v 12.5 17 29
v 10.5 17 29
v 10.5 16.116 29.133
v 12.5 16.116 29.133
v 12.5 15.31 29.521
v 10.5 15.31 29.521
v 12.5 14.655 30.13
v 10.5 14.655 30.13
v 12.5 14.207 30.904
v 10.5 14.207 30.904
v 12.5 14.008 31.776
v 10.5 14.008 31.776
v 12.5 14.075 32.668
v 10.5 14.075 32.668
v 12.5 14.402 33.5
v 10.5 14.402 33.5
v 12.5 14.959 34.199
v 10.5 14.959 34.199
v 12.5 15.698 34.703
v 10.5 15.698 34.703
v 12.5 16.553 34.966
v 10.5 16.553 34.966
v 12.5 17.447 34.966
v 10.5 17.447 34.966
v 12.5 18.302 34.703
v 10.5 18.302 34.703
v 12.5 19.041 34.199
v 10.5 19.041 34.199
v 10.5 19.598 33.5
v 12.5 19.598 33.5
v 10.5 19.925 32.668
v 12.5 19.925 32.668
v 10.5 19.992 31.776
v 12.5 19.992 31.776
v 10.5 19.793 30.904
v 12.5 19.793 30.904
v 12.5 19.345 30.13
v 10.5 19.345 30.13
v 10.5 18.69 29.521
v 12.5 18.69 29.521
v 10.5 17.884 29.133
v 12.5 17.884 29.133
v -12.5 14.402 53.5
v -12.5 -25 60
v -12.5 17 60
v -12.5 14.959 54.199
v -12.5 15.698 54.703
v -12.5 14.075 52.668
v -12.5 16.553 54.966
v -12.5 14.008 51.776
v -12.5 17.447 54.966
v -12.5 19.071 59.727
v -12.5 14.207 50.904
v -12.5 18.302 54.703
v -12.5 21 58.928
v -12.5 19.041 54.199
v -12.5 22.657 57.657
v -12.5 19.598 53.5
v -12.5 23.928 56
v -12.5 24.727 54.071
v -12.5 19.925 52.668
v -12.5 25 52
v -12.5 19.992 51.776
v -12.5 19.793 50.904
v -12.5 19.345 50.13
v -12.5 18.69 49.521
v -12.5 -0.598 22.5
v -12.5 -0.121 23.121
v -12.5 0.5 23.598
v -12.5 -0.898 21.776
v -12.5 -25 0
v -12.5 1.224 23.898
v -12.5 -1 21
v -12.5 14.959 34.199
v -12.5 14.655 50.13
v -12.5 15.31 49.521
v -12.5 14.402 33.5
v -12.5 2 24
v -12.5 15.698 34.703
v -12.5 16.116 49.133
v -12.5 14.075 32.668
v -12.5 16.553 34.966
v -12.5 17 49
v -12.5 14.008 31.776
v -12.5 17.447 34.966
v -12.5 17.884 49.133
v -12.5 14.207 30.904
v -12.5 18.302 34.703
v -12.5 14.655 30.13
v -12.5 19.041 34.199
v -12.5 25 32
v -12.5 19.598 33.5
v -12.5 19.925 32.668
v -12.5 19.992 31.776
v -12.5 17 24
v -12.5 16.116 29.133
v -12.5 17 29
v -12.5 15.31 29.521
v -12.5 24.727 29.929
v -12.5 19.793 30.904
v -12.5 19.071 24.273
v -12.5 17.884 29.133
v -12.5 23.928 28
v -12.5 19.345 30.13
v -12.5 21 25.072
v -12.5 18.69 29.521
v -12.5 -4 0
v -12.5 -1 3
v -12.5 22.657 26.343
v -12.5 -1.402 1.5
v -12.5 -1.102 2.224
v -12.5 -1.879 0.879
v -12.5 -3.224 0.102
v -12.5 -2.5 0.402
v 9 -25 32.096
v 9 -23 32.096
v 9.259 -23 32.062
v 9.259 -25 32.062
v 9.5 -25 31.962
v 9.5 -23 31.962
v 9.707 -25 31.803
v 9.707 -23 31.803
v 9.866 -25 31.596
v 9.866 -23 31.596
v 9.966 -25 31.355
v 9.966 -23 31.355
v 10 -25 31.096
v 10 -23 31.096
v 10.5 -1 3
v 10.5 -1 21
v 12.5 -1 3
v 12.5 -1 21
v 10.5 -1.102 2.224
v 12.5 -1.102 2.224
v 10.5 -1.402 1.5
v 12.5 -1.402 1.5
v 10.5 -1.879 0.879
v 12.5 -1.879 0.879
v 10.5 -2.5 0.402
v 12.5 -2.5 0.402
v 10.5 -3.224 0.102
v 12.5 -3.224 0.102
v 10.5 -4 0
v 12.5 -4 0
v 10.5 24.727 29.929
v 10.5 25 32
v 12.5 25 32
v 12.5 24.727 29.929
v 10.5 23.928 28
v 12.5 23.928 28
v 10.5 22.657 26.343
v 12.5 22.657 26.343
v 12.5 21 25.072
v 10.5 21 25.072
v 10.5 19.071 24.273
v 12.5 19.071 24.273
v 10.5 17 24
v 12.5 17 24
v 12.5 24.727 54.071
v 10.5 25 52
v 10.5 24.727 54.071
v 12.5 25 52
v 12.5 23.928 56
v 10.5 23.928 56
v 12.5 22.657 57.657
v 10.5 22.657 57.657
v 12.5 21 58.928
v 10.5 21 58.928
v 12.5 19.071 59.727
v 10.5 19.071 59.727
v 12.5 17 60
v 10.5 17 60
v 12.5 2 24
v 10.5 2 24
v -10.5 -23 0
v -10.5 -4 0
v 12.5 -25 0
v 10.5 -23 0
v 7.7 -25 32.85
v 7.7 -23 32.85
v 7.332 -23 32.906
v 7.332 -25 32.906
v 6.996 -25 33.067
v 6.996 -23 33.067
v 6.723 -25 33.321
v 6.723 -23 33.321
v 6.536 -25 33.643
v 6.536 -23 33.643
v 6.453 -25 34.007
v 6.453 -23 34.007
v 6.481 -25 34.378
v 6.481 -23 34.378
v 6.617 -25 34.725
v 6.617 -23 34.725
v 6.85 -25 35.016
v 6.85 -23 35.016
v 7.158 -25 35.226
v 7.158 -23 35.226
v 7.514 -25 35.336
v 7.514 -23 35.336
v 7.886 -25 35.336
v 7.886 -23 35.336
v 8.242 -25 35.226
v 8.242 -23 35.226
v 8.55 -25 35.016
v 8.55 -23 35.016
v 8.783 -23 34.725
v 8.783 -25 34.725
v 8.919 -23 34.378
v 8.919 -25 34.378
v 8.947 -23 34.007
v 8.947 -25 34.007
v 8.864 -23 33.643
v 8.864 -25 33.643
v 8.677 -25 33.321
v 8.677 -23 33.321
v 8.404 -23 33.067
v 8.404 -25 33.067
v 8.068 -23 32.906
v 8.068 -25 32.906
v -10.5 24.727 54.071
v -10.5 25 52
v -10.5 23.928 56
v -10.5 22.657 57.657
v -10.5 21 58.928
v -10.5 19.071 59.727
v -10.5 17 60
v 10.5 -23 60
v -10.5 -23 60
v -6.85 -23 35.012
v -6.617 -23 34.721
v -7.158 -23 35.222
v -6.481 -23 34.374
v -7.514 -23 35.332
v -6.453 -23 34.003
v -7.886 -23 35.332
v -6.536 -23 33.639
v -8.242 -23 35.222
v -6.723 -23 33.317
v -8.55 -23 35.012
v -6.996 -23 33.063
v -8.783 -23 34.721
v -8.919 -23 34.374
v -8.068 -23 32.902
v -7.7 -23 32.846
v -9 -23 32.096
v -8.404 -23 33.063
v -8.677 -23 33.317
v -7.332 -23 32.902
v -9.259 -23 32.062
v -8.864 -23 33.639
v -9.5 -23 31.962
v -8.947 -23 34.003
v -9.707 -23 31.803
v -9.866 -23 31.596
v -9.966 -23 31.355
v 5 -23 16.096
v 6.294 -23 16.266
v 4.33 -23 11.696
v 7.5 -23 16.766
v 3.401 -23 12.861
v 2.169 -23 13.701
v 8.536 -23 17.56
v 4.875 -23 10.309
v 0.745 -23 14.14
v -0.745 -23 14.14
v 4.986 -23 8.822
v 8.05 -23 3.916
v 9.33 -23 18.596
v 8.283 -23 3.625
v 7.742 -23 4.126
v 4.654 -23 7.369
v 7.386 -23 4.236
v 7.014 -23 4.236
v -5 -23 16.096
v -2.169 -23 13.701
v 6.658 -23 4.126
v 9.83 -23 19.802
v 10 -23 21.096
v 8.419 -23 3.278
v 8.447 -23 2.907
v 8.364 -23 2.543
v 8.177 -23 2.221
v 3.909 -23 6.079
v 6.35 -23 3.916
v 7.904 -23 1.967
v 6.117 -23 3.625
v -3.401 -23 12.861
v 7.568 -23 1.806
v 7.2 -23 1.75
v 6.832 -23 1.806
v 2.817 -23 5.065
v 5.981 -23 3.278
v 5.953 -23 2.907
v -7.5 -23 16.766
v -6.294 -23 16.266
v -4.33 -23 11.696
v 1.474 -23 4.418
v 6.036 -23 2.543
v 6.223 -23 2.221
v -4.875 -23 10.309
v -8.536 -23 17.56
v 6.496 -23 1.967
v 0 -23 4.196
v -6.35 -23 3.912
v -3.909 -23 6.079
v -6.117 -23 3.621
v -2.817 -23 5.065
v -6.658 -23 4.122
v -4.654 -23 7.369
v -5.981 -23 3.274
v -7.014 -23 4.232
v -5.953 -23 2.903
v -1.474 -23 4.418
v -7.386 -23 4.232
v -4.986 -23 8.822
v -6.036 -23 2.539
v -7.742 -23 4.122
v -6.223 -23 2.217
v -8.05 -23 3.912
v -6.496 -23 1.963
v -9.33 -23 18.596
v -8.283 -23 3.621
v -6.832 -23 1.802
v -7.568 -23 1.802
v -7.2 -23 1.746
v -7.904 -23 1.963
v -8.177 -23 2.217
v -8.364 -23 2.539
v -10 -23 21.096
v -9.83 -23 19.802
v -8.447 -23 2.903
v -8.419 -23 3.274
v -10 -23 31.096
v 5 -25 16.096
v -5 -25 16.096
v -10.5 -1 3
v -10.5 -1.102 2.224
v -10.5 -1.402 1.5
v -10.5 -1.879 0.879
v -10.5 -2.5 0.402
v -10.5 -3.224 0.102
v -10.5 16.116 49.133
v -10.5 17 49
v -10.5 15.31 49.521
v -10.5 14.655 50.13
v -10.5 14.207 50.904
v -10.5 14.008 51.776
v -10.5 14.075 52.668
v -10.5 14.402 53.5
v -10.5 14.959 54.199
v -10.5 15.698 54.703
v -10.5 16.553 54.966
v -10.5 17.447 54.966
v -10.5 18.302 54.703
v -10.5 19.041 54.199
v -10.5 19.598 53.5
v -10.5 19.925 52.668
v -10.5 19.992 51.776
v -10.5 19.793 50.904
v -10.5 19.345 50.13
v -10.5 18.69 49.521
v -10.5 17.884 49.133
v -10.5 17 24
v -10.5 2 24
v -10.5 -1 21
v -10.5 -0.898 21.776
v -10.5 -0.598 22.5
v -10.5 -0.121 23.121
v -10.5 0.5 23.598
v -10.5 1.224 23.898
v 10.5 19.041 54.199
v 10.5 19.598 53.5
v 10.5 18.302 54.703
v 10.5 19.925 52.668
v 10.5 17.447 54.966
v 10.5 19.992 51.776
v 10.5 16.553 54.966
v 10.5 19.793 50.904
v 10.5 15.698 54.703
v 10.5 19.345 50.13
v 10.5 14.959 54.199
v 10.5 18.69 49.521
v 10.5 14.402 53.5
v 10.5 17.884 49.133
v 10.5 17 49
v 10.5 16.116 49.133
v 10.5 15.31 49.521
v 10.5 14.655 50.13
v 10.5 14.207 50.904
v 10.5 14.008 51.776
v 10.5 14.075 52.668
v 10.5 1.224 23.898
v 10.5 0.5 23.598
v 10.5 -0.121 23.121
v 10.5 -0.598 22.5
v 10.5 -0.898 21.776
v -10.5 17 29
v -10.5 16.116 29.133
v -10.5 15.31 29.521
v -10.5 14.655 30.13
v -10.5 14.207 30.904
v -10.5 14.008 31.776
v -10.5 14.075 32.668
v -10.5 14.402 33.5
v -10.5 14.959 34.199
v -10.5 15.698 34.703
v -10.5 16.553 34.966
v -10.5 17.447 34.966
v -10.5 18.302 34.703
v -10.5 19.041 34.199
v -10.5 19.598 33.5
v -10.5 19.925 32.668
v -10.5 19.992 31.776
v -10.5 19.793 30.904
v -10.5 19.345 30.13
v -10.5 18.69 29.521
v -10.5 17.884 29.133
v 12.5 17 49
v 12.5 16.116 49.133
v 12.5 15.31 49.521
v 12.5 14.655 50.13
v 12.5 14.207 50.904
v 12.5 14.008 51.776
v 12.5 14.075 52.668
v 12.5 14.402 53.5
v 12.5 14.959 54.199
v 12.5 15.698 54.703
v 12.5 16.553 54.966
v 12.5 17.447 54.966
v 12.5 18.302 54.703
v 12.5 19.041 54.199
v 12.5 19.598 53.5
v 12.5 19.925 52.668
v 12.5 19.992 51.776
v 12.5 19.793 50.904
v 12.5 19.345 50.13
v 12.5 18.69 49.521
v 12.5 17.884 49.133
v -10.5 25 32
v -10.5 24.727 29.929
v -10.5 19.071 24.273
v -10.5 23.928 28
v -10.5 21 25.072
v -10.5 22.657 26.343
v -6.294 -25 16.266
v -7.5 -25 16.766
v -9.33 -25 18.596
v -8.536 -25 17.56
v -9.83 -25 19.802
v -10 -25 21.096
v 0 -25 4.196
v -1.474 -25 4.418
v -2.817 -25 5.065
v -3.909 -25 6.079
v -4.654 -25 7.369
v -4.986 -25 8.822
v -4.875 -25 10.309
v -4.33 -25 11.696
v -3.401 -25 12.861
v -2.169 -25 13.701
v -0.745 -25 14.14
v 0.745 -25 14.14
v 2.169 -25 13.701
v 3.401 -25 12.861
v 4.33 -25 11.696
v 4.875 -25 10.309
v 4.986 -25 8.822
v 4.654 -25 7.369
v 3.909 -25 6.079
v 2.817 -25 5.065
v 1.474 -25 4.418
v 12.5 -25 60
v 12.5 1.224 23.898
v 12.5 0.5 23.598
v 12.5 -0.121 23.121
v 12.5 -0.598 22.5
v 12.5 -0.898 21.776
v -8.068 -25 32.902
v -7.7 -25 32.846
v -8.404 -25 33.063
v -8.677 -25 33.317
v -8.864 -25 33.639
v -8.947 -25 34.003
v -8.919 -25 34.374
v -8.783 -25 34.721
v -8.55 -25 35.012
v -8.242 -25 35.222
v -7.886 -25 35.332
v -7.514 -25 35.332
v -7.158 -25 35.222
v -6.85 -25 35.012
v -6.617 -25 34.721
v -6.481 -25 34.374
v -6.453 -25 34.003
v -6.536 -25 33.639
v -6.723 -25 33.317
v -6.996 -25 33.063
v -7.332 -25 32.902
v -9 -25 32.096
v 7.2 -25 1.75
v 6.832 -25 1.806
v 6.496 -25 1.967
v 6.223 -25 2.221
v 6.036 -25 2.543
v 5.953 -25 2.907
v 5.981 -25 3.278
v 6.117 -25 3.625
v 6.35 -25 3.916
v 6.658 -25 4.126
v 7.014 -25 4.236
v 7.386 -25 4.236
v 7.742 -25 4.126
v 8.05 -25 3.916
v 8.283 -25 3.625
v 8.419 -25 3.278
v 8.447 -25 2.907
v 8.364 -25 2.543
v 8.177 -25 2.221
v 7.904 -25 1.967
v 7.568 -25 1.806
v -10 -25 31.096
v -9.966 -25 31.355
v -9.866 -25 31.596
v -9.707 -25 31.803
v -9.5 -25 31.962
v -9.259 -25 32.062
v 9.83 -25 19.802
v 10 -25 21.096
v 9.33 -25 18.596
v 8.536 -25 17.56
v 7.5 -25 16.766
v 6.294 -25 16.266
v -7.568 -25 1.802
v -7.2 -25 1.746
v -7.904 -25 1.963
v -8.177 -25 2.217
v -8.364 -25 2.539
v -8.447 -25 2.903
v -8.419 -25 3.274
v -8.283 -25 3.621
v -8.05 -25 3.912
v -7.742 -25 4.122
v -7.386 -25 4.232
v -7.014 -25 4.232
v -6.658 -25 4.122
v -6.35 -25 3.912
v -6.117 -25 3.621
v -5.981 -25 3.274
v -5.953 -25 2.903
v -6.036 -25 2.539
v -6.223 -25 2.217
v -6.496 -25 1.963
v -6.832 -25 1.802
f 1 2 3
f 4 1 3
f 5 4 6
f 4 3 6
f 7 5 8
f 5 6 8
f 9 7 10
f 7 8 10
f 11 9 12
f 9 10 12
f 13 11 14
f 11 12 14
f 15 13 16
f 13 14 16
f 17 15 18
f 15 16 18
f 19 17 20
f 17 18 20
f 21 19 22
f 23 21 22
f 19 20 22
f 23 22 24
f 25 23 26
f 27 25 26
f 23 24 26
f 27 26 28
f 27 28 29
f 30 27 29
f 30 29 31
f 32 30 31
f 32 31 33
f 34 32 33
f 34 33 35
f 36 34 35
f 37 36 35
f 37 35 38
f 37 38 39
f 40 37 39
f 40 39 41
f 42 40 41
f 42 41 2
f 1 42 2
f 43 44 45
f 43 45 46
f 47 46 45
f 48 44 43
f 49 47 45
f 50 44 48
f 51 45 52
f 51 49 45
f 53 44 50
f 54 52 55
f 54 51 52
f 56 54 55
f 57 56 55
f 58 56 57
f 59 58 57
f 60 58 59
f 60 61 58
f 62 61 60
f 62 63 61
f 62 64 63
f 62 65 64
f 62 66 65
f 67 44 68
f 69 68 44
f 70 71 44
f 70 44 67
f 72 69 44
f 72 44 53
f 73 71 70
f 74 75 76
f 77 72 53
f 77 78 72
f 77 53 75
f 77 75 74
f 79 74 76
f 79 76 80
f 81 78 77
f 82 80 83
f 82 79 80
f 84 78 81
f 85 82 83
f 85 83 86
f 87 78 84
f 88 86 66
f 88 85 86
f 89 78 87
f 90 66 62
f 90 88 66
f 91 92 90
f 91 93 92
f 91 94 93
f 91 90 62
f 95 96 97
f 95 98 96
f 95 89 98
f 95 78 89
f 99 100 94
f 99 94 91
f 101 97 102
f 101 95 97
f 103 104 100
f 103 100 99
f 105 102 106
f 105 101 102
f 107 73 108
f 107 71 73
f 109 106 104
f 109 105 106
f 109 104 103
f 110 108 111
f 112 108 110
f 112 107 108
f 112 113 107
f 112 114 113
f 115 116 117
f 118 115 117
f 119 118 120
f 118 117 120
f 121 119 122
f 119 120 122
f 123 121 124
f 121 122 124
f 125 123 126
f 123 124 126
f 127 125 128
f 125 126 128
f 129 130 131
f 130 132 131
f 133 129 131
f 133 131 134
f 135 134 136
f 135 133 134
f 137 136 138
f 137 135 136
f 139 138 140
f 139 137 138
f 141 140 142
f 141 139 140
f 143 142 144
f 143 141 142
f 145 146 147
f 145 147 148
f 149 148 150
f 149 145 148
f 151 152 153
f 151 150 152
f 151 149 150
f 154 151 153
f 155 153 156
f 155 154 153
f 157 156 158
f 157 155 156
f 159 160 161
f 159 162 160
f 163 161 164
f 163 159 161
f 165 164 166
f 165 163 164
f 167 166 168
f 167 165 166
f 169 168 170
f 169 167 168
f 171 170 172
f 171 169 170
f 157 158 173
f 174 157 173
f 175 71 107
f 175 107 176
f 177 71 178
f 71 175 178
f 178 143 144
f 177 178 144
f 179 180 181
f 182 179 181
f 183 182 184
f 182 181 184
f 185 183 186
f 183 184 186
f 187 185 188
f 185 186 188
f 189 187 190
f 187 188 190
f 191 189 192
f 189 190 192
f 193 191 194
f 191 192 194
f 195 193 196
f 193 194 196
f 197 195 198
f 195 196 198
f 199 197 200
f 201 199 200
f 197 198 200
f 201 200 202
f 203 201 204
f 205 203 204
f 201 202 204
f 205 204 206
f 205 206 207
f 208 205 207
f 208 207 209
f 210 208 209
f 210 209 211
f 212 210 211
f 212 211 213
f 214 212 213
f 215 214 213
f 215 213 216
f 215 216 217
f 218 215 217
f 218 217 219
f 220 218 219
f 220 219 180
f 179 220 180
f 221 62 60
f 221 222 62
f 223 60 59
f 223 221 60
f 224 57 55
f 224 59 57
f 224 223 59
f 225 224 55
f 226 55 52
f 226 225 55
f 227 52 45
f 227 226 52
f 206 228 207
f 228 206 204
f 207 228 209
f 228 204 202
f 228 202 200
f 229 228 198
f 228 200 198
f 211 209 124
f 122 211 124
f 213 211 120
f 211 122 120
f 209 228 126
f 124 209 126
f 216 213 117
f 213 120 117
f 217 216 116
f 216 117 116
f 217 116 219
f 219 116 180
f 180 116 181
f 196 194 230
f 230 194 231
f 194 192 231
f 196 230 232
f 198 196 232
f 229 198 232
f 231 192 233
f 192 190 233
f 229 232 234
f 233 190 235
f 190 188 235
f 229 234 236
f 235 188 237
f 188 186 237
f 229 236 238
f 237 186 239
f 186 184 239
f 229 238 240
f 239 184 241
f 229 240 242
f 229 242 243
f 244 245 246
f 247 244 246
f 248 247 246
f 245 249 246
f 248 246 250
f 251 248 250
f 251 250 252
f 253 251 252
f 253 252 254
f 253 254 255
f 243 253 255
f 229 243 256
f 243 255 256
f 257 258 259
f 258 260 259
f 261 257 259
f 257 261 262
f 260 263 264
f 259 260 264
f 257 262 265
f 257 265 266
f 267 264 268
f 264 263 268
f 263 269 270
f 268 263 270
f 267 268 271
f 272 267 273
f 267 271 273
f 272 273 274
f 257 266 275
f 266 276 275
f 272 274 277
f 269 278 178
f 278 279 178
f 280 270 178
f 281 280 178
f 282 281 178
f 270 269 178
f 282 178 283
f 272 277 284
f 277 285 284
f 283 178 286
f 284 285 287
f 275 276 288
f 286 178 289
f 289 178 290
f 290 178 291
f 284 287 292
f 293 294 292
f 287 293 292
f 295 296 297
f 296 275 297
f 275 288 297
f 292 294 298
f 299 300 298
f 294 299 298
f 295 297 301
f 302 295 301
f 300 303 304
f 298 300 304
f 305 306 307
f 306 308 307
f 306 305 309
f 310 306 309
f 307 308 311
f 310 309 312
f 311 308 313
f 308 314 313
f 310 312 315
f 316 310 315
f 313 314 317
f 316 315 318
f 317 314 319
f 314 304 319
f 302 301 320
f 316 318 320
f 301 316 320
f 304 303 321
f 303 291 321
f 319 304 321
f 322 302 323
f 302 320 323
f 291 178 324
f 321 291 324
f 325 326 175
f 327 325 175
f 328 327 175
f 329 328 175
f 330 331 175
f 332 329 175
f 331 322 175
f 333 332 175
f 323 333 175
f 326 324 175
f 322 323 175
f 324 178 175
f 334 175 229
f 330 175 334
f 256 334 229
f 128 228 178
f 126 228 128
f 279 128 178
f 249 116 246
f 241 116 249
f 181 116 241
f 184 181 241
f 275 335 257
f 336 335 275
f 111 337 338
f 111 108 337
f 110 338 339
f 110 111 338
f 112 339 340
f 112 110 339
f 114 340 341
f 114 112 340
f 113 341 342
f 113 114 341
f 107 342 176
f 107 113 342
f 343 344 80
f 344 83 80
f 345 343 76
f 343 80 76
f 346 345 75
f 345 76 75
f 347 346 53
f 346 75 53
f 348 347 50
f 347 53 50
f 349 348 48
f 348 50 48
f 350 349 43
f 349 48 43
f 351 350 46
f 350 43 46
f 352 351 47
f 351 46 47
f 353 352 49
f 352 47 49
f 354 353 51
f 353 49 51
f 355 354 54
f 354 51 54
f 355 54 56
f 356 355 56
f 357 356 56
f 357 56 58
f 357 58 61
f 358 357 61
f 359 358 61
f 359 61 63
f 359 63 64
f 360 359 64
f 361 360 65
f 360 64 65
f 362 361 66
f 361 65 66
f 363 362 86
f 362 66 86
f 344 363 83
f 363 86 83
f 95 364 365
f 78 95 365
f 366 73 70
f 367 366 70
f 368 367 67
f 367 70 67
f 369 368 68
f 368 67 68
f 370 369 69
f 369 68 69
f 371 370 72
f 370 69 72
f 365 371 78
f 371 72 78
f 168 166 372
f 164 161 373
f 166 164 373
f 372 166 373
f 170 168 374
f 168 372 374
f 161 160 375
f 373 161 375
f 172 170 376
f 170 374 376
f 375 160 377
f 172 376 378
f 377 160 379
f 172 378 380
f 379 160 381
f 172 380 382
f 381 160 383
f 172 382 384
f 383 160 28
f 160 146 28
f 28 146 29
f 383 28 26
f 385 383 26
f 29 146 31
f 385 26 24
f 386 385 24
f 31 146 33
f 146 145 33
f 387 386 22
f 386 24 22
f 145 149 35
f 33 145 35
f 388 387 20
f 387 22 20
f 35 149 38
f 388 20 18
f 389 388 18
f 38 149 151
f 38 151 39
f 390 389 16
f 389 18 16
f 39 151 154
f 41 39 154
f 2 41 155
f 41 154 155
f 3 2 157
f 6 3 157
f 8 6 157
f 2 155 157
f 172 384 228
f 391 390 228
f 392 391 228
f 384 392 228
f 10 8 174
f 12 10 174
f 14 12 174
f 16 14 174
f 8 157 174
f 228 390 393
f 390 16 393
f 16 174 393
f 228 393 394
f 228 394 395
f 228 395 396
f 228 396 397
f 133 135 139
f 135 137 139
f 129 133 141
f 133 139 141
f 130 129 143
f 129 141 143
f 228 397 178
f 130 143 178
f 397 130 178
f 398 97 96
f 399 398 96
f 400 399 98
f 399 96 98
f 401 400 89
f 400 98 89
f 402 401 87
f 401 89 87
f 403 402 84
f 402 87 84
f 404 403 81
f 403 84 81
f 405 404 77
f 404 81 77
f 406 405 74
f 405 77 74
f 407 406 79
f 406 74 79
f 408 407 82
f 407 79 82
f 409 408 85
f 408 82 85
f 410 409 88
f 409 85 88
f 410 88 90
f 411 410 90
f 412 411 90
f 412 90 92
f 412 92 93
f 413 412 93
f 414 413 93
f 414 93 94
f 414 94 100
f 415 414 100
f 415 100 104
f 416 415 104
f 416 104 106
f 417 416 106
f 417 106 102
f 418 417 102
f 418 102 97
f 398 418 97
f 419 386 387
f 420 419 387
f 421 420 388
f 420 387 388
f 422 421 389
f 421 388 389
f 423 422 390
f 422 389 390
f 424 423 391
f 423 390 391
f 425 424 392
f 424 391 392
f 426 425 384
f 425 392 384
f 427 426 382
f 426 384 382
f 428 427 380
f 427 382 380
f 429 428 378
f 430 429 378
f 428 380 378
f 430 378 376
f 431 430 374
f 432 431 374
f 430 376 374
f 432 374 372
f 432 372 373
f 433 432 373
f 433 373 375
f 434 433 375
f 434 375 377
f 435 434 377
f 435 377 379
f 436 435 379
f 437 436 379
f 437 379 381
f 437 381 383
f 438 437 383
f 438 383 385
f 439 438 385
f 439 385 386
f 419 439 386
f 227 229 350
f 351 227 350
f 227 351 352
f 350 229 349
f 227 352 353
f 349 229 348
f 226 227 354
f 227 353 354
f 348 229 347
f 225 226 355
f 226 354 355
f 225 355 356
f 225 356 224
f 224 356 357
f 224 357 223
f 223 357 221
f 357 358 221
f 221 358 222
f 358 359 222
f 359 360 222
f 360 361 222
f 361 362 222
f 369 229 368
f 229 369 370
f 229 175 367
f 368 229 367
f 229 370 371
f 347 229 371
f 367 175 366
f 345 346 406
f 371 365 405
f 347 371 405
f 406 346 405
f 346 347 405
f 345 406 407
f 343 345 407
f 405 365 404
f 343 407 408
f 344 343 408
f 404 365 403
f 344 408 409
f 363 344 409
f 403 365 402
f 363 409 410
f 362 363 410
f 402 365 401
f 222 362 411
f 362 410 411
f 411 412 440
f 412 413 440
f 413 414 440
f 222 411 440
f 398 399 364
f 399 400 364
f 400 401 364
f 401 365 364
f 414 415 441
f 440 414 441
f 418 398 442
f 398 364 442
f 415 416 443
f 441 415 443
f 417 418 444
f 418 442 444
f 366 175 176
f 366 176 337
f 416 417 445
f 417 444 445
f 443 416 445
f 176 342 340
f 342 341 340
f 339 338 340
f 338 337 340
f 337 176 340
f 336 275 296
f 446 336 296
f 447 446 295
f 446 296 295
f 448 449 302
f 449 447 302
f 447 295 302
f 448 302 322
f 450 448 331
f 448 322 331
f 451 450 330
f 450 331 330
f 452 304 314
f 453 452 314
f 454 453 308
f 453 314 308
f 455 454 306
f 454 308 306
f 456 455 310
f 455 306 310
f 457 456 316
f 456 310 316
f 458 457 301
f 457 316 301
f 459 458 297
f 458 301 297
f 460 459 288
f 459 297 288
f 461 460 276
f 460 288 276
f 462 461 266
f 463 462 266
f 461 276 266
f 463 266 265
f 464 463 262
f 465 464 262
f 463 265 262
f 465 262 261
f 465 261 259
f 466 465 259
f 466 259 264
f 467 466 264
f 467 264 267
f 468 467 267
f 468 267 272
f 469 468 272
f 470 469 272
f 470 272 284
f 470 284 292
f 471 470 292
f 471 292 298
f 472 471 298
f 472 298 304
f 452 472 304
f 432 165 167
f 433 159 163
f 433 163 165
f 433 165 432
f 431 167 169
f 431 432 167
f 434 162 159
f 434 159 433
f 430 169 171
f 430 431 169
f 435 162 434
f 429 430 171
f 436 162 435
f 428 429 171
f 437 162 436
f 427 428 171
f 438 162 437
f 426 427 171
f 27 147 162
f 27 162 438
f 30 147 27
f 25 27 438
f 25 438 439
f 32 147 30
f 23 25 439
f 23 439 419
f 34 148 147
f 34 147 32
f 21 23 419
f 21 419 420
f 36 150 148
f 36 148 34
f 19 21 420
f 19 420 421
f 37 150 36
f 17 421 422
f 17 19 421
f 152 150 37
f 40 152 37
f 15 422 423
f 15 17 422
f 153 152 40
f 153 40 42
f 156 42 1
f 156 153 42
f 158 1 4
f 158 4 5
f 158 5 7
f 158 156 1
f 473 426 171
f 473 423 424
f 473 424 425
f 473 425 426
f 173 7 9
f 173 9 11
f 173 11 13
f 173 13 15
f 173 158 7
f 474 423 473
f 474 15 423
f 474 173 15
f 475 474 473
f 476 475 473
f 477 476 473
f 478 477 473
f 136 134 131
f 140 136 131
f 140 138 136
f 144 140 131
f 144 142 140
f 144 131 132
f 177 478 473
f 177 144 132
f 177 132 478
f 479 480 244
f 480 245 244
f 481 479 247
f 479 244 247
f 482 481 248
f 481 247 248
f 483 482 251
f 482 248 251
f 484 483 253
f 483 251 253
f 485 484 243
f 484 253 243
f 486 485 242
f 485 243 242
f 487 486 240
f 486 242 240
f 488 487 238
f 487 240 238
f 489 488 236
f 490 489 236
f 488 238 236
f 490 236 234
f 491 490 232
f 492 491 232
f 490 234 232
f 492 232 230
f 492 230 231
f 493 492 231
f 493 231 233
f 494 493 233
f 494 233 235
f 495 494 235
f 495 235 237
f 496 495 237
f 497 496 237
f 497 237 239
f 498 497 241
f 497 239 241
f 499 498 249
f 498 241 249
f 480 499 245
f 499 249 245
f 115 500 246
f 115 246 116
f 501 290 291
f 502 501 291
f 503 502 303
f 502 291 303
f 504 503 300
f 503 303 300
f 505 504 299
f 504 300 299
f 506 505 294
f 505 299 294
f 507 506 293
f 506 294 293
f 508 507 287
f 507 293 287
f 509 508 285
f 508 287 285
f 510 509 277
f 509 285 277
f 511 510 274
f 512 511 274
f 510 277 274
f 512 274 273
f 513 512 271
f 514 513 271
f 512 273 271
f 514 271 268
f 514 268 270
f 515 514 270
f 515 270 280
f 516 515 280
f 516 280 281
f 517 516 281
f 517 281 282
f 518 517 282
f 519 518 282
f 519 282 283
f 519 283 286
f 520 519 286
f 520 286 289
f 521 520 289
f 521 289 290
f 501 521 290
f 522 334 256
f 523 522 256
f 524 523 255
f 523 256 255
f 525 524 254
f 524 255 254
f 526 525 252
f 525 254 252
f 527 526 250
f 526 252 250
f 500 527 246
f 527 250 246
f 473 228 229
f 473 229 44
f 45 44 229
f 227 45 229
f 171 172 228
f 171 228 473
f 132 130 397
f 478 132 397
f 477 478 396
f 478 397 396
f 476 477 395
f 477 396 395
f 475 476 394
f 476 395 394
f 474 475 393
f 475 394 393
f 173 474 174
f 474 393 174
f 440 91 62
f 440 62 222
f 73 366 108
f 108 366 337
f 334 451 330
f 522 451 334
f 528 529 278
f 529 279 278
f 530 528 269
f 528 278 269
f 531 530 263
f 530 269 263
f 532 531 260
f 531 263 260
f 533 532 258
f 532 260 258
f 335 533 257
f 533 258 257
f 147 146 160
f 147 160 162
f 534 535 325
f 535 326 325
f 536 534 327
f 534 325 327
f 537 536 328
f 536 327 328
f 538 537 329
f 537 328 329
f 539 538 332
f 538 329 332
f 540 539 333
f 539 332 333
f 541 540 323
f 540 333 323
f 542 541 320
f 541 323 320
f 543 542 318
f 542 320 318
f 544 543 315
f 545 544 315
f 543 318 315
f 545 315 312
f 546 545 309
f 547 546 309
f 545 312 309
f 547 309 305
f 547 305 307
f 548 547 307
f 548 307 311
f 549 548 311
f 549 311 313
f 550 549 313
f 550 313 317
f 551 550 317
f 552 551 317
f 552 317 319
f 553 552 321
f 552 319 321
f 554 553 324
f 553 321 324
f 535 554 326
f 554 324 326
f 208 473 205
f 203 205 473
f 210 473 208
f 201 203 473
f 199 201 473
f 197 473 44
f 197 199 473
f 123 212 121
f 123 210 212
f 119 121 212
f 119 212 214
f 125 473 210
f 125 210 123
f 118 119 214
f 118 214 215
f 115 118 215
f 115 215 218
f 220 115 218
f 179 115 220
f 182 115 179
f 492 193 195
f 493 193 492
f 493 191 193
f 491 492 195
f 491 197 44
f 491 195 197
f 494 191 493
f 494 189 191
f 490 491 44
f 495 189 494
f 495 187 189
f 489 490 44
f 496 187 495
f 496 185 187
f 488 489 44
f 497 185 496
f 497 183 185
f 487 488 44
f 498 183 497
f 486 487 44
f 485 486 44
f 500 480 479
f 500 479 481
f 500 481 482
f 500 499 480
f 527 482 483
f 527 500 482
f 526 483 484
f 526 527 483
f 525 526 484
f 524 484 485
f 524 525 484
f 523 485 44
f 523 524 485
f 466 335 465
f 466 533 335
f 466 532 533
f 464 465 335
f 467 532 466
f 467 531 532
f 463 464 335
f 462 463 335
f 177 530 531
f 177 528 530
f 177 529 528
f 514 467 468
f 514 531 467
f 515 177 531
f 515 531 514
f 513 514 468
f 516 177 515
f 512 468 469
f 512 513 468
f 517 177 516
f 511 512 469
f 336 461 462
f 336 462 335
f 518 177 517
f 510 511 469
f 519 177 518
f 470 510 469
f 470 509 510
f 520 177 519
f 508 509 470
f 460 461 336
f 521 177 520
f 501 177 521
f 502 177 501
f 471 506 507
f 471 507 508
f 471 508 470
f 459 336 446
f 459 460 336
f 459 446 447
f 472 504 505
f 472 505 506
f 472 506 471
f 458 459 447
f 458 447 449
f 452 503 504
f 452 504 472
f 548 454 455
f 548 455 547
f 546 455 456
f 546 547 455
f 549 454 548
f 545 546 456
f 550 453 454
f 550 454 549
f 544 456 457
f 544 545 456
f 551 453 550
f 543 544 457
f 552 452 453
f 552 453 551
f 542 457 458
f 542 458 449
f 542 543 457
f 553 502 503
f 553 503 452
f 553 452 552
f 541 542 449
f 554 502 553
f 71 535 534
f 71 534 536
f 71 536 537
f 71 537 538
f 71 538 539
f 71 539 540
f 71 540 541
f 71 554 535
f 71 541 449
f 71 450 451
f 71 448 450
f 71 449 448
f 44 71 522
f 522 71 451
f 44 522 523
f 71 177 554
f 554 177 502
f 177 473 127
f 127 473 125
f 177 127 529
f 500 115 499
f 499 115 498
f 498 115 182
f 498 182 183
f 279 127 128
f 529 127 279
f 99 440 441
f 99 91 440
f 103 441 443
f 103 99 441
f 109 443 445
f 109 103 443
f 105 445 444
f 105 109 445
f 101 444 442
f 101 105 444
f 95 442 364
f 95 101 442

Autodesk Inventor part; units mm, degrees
ref_plane "YZ Plane" through (0, 0, 0) normal (1, 0, 0) x (0, 1, 0)
ref_plane "XZ Plane" through (0, 0, 0) normal (0, 1, 0) x (-1, 0, 0)
ref_plane "XY Plane" through (0, 0, 0) normal (0, 0, 1) x (1, 0, 0)
sketch "スケッチ1" plane through (0, 0, 0) normal (0, 0, 1) x (1, 0, 0)
  line L0 (-12.5, 25) -> (12.5, 25)
  line L1 (12.5, 25) -> (12.5, -25)
  line L2 (12.5, -25) -> (-12.5, -25)
  line L3 (-12.5, -25) -> (-12.5, 25)
  line L4 (-10.5, 25) -> (10.5, 25)
  line L5 (10.5, 25) -> (10.5, -23)
  line L6 (10.5, -23) -> (-10.5, -23)
  line L7 (-10.5, -23) -> (-10.5, 25)
  point P0 (0, 0)
  dimension "d0" = 25
  dimension "d1" = 50
  dimension "d2" = 25
  dimension "d3" = 12.5
  dimension "d4" = 2
  dimension "d5" = 2
  dimension "d6" = 2
extrude "押し出し1" add sketch "スケッチ1" along normal blind 60 contours L0 L7 L6 L5 L1 L2 L3
sketch "スケッチ2" plane through (12.5, -25, 0) normal (1, 0, 0) x (0, 0, -1)
  line L0 (0, 50) -> (-60, 50) projected
  line L1 (-30, 50) -> (-30, 0)
  line L2 (0, 0) -> (-60, 0) projected
  line L3 (-60, 50) -> (-60, 0) projected
  point P0 (0, 25)
  point P1 (-52, 42)
  point P2 (-32, 42)
  dimension "d11" = 8
  dimension "d12" = 8
  dimension "d76" = 8
  dimension "d84" = 20
hole "Hole1" at (12.5, 17, 52) at (12.5, 17, 32) direction (-1, 0, 0) diameter 6 end through all
sketch "スケッチ5" plane through (-12.5, -25, 0) normal (0, -1, 0) x (1, 0, 0)
  line L0 (25, 60) -> (0, 60) projected
  line L1 (25, 0) -> (25, 60) projected
  line L2 (12.5, 60) -> (12.5, 0)
  line L3 (0, 0) -> (25, 0) projected
  point P0 (4.8, 34.096)
  point P1 (5.3, 2.996)
  point P2 (19.7, 3)
  point P3 (20.2, 34.1)
  dimension "d46" = 14.4
  dimension "d47" = 15.4
  dimension "d48" = 31.1
  dimension "d50" = 15.4
  dimension "d51" = 14.4
  dimension "d52" = 31.1
  dimension "d53" = 3
hole "Hole3" at (-7.7, -25, 34.096) at (-7.2, -25, 2.996) at (7.2, -25, 3) at (7.7, -25, 34.1) direction (0, 1, 0) diameter 2.5 end through all
sketch "スケッチ6" plane through (-12.5, -25, 0) normal (0, -1, 0) x (1, 0, 0)
  circle A0 centre (5.3, 2.996) radius 1.25 projected
  point P0 (12.5, 0)
  point P1 (12.5, 9.196)
  dimension "d54" = 7.2
  dimension "d55" = 6.2
hole "Hole4" at (0, -25, 9.196) direction (0, 1, 0) diameter 10 depth 8 tip angle 118
sketch "スケッチ7" plane through (-12.5, -25, 0) normal (0, -1, 0) x (1, 0, 0)
  circle A0 centre (4.8, 34.096) radius 1.25 projected
  line L0 (25, 60) -> (0, 60) projected
  line L1 (0, 0) -> (25, 0) projected
  line L2 (2.5, 32.096) -> (22.5, 32.096)
  line L3 (22.5, 32.096) -> (22.5, 16.096)
  line L4 (22.5, 16.096) -> (2.5, 16.096)
  line L5 (2.5, 16.096) -> (2.5, 32.096)
  line L6 (12.5, 60) -> (12.5, 0)
  dimension "d63" = 16
  dimension "d64" = 20
  dimension "d65" = 20
  dimension "d66" = 2
extrude "押し出し3" cut sketch "スケッチ7" against normal through all contours L2 L6 L4 L5 | L2 L3 L4 L6
fillet "フィレット3" radius 5 2 edges at (-10, -24, 16.096) (10, -24, 16.096)
fillet "フィレット4" radius 1 2 edges at (-10, -24, 32.096) (10, -24, 32.096)
sketch "スケッチ9" plane through (12.5, -25, 0) normal (1, 0, 0) x (0, 0, -1)
  circle A0 centre (-32, 42) radius 3 projected
  line L0 (0, 50) -> (-24, 50)
  line L1 (-24, 50) -> (-24, 24)
  line L2 (-24, 24) -> (0, 24)
  line L3 (0, 24) -> (0, 50)
  line L4 (0, 2) -> (-60, 2) projected
  point P0 (0, 25)
  dimension "d77" = 8
  dimension "d78" = 22
extrude "押し出し5" cut sketch "スケッチ9" against normal through all contours L3 L2 L1 L0
fillet "フィレット5" radius 3 2 edges at (11.5, -1, 24) (-11.5, -1, 24)
fillet "フィレット6" radius 8 4 edges at (-11.5, 25, 60) (11.5, 25, 60) (11.5, 25, 24) (-11.5, 25, 24)
fillet "フィレット7" radius 3 2 edges at (11.5, -1, 0) (-11.5, -1, 0)
equation "\"d1\" = 2 * d0"
equation "\"d2\" = 0.5 * d1"
equation "\"d3\" = 0.5 * d0"
equation "\"d4\" = d5"
equation "\"d6\" = d5"
equation "\"d12\" = d11"
equation "\"d76\" = d11"
equation "\"d50\" = d47"
equation "\"d51\" = d46"
equation "\"d52\" = d48"
equation "\"d65\" = d64"
properties part number "JointC3"
